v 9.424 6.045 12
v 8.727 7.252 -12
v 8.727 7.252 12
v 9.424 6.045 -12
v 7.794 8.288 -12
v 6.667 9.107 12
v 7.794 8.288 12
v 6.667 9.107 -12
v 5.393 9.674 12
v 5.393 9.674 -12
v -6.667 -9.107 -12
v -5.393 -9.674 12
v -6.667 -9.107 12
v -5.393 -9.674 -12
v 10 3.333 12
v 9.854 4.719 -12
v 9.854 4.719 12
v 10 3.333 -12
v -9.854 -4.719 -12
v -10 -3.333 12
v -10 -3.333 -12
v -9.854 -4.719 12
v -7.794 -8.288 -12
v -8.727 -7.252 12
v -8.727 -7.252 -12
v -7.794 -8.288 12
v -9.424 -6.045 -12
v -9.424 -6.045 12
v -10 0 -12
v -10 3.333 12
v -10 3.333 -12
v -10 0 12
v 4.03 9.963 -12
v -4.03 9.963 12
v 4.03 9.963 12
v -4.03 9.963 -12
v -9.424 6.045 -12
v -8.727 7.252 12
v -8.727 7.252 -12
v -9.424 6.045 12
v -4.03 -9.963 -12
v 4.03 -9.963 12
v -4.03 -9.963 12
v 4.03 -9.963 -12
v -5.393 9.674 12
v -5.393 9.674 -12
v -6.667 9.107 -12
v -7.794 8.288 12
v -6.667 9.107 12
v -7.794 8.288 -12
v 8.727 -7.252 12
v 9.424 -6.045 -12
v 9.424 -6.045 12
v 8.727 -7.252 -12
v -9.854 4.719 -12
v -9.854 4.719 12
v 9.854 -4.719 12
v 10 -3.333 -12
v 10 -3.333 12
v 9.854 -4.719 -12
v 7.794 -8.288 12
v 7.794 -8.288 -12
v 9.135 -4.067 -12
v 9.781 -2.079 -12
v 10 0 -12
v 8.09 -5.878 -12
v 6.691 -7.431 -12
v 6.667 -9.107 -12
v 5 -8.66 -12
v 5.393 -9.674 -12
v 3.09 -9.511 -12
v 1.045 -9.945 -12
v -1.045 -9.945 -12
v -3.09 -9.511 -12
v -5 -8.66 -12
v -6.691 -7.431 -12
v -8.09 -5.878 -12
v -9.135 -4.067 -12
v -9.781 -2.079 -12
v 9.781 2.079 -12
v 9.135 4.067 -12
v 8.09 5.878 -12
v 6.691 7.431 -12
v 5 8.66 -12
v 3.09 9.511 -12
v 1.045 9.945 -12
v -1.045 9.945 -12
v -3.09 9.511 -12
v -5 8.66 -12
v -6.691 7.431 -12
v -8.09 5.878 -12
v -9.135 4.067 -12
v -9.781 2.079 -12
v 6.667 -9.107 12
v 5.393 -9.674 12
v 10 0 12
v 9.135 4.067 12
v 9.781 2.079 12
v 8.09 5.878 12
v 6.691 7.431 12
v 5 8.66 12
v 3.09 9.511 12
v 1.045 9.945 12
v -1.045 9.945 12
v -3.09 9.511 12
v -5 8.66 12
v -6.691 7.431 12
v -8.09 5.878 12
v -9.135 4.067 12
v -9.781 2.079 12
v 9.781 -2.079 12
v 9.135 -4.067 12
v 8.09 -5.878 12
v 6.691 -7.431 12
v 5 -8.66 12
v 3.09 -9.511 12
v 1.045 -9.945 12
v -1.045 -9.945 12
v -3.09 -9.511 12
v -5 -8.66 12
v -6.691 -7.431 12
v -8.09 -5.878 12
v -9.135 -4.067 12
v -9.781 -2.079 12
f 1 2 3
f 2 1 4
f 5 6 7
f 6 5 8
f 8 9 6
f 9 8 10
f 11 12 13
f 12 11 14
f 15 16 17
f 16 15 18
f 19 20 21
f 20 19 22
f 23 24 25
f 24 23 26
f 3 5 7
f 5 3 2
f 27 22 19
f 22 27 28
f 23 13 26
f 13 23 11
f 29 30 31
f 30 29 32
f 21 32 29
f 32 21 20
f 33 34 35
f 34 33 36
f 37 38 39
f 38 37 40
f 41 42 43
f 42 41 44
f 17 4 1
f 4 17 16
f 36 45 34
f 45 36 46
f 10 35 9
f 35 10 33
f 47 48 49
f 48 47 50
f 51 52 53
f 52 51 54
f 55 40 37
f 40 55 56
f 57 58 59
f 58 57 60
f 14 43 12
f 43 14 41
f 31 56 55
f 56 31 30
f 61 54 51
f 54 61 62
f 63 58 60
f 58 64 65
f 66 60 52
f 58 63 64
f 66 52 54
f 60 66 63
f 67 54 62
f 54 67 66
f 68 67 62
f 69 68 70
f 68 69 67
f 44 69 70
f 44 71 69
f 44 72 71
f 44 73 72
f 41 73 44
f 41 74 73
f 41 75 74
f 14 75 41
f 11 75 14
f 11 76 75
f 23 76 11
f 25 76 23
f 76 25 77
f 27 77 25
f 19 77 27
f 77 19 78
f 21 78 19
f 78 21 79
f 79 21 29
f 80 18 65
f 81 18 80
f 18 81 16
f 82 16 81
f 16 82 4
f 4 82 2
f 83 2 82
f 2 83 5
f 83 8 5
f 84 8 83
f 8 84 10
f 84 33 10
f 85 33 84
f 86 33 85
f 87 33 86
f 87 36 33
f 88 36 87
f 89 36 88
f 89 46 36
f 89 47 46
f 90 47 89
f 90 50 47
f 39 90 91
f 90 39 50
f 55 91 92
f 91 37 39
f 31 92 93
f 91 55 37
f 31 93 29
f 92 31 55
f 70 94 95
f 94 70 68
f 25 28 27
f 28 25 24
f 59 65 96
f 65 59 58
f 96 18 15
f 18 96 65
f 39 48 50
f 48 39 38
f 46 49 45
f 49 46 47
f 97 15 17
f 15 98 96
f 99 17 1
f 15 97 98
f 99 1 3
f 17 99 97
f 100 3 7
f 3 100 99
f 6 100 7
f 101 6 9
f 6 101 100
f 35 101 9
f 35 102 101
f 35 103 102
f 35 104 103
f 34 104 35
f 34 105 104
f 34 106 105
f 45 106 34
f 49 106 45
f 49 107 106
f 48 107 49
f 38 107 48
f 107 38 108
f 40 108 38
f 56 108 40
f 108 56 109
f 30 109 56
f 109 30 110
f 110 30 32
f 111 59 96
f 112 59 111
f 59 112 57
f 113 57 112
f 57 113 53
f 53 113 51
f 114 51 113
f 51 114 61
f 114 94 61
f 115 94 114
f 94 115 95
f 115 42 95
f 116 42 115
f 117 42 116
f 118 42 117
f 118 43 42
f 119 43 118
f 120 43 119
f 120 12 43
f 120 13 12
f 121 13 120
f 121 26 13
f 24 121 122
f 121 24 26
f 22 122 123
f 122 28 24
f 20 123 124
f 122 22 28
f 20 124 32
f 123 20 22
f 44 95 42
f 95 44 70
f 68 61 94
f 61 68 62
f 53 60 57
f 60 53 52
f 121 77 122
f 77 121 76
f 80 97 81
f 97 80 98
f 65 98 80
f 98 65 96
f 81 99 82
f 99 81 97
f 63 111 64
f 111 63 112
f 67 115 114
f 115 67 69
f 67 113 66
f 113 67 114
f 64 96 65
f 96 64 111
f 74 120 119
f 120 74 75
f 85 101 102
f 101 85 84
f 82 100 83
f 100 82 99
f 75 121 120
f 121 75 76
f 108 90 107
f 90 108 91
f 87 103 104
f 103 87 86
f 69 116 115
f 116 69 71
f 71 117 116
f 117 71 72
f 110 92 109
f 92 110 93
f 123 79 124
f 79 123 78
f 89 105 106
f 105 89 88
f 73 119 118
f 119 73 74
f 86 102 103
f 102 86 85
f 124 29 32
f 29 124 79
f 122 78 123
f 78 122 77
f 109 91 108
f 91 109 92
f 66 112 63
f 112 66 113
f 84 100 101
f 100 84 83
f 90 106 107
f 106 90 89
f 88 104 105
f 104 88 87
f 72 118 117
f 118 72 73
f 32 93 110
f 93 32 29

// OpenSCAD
// file: standard.scad
BOLT_D = [
	-1, //0 index is not used but reduces computation
	-1,
	-1,
	2.980,	//m3
	3.978,	//m4
	4.976,	//m5
	5.974,	//m6
	-1,
	7.972,	//m8
	-1,
	9.968,	//m10
	-1,
	11.966	//m12
];

NUT_D = [
	-1, //0 index is not used but reduces computation
	-1,
	-1,
	6.40,	//m3
	8.10,	//m4
	9.20,	//m5
	11.50,	//m6
	-1,
	15.00,	//m8
	-1,
	19.60,	//m10
	-1,
	22.10	//m12
];

NUT_H = [
	-1, //0 index is not used but reduces computation
	-1,
	-1,
	2.40,	//m3
	3.20,	//m4
	4.00,	//m5
	5.00,	//m6
	-1,
	6.50,	//m8
	-1,
	8.00,	//m10
	-1,
	10.00	//m12
];

NEMA_F = [	//faceplate size
	-1,-1,-1,-1,-1,-1,-1,-1,-1,-1,-1,
	28.0,	//Nema11
	-1,-1,
	35.6,	//Nema14
	-1,-1,
	42.3,	//Nema17
	-1,-1,-1,-1,-1,
	58.4	//Nema23
];

NEMA_H = [	//halved distance between holes
	-1,-1,-1,-1,-1,-1,-1,-1,-1,-1,-1,
	11.50,	//Nema11
	-1,-1,
	13.00,	//Nema14
	-1,-1,
	15.50,	//Nema17
	-1,-1,-1,-1,-1,
	23.57	//Nema23
];

NEMA_S = [	//shaft diameter
	-1,-1,-1,-1,-1,-1,-1,-1,-1,-1,-1,
	4.0,	//Nema11
	-1,-1,
	5.0,	//Nema14
	-1,-1,
	5.0,	//Nema17
	-1,-1,-1,-1,-1,
	6.35	//Nema23
];
// file: config.scad
include <standard.scad>

//render & print
$fs=.5;						//minimum arc segment
e=.1;						//extra length for manfold mesh (do not change)
tol=.5;						//xy compensation for small holes

//$t=.35;					//
x=0;//*cos($t*360);			// printhead position
y=0;//*sin($t*360);		//

wall=5/2;					//(some) thin wall thickness

//frame
f_t=10;						//frame thickness
f_x=200;
f_y=200;
f_z=65;
f_tr=8;						//corner threaded rods ISO diameter 
fy_ko=2;					//keepout between frame and x_carriage

//microswitch
ms_h=6;						//height
ms_l=13;					//length
ms_t=6;						//thickness

//motors
ab_motor=17;				//xy motors
ab_motor_l=47;				//xy motors length
z_motor=17;					//z motor
z_motor_l=47;				//z motor length

//x
x_d=15;						//bearing diameter
x_l=24;						//bearing length
x_s=8;						//shaft diameter
x_fan=30;					//hotend fan diameter
x_blower=35;				//blower fan diameter
x_fans_m=6;					//fan and blower mount holes spacing

x_fan_duct=28;
x_blower_duct=25;
x_shroud=10;
x_shroud_t=5;
x_shroud_w=2;


//y
y_d=15;						//bearing diameter
y_l=24;						//bearing length
y_s=8;						//shaft diameter
y_shaft_distance_extra=3;	//extra distance between shafts
y_sp=6;						//shaft position (relative to frame)


//z
z_s=8;


//idler
idler_d=8;					//groove bearing OD
idler_l=3;					//groove bearing thickness
idler_s=3;					//groove bearing ID

idler_hk=2;					//idler horizontal keepout
idler_vk=.5;				//idler verical keepout (washer thickness?)

//pulley
pulley_d=200/PI/5;			//5 steps per mm (80 with 16x microstepping)
pulley_h=2;
pulley_rivet=1.5;
pulley_flat_shaft=true;

//bed
bed_x=100;
bed_y=100;

// ------
//  math
// ------
pulley_length = pulley_h+4*pulley_rivet+NUT_D[3];
pulley_diameter = pulley_d+pulley_rivet*2;
pulley_wire_height = pulley_h/2+pulley_rivet*2+NUT_D[3];
pulley_screw_length = (pulley_diameter-NEMA_S[17])/2;

y_shaft_distance = NEMA_F[ab_motor]+y_s+y_shaft_distance_extra;

x_shaft_distance = y_shaft_distance-y_d-y_s;

z_shaft_distance = (f_x-f_t*2)/2;

ab_motor_xpos = f_x/2-f_t-y_sp-y_d/2-wall;
ab_motor_ypos = f_y/2-f_t-(NEMA_H[ab_motor]*2+BOLT_D[3])/2+(f_t-f_tr)/2;

use <press_fit.scad>
// main file
include <config.scad>

module press_fit(d=0, h=0, center=false) {
	
	linear_extrude(height=h, center=center)
		minkowski() {
			square([d/3,d/3], center=true);
			circle(r=d/3);
		}
}

difference() {
	press_fit(d=20, h=24, center=true);
	cylinder(d=20, h=24+e, center=true);
}
